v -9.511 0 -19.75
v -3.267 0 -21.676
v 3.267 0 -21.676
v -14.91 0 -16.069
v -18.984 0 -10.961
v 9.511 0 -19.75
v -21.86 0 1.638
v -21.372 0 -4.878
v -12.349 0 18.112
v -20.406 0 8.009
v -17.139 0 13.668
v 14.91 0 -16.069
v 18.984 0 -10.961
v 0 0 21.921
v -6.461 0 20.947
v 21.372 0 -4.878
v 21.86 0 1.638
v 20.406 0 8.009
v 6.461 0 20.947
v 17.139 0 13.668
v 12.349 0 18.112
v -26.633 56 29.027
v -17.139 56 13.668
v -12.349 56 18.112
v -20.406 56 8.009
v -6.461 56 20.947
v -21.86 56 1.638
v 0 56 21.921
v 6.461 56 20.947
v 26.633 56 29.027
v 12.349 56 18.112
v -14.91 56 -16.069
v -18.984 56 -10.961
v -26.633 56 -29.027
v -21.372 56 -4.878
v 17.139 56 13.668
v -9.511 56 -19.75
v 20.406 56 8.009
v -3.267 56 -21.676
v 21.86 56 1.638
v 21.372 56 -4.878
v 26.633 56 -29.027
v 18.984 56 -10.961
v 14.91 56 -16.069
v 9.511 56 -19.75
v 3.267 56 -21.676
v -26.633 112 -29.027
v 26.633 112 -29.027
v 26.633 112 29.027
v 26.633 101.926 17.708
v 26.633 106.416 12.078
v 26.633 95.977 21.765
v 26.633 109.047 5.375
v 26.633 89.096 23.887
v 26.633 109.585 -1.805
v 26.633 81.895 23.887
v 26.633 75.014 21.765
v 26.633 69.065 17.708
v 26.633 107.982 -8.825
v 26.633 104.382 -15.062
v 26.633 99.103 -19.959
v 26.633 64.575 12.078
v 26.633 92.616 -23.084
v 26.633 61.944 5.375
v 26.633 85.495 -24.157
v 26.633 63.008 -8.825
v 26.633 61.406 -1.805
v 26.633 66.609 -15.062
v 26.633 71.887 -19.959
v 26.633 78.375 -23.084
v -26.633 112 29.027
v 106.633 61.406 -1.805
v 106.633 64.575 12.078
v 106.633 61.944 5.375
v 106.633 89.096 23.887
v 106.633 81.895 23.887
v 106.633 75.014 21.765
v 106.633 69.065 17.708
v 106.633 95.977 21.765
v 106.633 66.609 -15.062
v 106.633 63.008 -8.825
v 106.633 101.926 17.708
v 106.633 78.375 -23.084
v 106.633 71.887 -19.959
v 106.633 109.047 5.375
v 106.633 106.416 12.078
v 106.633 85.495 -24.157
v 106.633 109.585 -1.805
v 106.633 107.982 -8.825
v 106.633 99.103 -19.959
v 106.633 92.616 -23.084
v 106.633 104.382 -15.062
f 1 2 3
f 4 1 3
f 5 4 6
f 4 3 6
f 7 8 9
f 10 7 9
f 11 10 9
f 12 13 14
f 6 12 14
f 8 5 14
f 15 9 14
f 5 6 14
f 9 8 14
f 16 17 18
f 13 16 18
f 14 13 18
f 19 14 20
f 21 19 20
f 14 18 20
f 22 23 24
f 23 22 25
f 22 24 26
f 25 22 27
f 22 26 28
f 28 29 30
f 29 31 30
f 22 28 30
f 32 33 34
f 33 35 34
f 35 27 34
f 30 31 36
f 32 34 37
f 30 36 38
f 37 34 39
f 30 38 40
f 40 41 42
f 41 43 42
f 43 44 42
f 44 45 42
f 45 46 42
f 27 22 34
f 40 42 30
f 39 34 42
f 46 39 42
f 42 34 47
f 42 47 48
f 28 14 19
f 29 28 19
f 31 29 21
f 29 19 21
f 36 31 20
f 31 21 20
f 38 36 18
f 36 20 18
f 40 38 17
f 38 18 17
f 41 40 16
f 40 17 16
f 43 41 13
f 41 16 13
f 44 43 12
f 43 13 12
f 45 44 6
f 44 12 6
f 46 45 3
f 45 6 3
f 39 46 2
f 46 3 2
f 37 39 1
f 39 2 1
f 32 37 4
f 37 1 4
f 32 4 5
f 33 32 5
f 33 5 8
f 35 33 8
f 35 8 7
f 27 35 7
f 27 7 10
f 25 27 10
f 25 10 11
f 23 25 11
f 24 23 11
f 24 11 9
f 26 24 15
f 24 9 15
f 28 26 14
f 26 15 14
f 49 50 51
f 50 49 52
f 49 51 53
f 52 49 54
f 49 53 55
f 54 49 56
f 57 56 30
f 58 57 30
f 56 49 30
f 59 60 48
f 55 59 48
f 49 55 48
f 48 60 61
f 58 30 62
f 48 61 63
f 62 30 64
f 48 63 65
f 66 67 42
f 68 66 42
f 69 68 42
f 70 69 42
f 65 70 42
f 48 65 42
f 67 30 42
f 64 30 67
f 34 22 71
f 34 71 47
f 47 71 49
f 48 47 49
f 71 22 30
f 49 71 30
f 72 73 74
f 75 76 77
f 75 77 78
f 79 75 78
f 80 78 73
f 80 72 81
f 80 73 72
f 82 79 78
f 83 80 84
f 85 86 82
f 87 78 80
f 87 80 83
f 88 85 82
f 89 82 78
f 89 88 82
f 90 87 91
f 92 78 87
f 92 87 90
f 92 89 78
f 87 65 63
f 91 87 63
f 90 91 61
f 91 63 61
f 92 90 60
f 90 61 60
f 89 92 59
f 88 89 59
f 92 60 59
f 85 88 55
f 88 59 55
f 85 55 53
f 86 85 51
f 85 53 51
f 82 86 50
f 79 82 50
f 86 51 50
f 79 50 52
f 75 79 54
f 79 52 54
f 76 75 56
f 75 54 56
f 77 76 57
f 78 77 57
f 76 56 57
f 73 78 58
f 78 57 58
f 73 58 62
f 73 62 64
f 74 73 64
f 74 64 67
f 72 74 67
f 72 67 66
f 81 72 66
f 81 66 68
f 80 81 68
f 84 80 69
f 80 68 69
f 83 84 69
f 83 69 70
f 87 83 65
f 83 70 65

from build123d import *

# Parameters (mm, degrees)
SKETCH1_R           = 21.921131465
BOSS_EXTRUDE1_DEPTH = 56
SKETCH2_W           = 53.266946292
SKETCH2_H           = 58.053682116
BOSS_EXTRUDE2_DEPTH = 56
SKETCH3_R           = 24.156846208
BOSS_EXTRUDE3_DEPTH = 80


with BuildPart() as part:
    # Sketch1 → Boss-Extrude1 (new body)
    with BuildSketch(Plane(origin=(0, 0, 0), x_dir=(1, 0, 0), z_dir=(0, 1, 0))):
        with Locations(Location((0, 0, 0), (0, 0, 270))):
            Circle(SKETCH1_R)
    extrude(amount=BOSS_EXTRUDE1_DEPTH)

    # Sketch2 → Boss-Extrude2 (add)
    with BuildSketch(Plane(origin=(0, 56, 0), x_dir=(1, 0, 0), z_dir=(0, 1, 0))):
        Rectangle(SKETCH2_W, SKETCH2_H)
    extrude(amount=BOSS_EXTRUDE2_DEPTH)

    # Sketch3 → Boss-Extrude3 (add)
    with BuildSketch(Plane(origin=(26.633473146, 0, 0), x_dir=(0, 0, -1), z_dir=(1, 0, 0))):
        with Locations((0, 85.49534666)):
            Circle(SKETCH3_R)
    extrude(amount=BOSS_EXTRUDE3_DEPTH)


solid = part.part
